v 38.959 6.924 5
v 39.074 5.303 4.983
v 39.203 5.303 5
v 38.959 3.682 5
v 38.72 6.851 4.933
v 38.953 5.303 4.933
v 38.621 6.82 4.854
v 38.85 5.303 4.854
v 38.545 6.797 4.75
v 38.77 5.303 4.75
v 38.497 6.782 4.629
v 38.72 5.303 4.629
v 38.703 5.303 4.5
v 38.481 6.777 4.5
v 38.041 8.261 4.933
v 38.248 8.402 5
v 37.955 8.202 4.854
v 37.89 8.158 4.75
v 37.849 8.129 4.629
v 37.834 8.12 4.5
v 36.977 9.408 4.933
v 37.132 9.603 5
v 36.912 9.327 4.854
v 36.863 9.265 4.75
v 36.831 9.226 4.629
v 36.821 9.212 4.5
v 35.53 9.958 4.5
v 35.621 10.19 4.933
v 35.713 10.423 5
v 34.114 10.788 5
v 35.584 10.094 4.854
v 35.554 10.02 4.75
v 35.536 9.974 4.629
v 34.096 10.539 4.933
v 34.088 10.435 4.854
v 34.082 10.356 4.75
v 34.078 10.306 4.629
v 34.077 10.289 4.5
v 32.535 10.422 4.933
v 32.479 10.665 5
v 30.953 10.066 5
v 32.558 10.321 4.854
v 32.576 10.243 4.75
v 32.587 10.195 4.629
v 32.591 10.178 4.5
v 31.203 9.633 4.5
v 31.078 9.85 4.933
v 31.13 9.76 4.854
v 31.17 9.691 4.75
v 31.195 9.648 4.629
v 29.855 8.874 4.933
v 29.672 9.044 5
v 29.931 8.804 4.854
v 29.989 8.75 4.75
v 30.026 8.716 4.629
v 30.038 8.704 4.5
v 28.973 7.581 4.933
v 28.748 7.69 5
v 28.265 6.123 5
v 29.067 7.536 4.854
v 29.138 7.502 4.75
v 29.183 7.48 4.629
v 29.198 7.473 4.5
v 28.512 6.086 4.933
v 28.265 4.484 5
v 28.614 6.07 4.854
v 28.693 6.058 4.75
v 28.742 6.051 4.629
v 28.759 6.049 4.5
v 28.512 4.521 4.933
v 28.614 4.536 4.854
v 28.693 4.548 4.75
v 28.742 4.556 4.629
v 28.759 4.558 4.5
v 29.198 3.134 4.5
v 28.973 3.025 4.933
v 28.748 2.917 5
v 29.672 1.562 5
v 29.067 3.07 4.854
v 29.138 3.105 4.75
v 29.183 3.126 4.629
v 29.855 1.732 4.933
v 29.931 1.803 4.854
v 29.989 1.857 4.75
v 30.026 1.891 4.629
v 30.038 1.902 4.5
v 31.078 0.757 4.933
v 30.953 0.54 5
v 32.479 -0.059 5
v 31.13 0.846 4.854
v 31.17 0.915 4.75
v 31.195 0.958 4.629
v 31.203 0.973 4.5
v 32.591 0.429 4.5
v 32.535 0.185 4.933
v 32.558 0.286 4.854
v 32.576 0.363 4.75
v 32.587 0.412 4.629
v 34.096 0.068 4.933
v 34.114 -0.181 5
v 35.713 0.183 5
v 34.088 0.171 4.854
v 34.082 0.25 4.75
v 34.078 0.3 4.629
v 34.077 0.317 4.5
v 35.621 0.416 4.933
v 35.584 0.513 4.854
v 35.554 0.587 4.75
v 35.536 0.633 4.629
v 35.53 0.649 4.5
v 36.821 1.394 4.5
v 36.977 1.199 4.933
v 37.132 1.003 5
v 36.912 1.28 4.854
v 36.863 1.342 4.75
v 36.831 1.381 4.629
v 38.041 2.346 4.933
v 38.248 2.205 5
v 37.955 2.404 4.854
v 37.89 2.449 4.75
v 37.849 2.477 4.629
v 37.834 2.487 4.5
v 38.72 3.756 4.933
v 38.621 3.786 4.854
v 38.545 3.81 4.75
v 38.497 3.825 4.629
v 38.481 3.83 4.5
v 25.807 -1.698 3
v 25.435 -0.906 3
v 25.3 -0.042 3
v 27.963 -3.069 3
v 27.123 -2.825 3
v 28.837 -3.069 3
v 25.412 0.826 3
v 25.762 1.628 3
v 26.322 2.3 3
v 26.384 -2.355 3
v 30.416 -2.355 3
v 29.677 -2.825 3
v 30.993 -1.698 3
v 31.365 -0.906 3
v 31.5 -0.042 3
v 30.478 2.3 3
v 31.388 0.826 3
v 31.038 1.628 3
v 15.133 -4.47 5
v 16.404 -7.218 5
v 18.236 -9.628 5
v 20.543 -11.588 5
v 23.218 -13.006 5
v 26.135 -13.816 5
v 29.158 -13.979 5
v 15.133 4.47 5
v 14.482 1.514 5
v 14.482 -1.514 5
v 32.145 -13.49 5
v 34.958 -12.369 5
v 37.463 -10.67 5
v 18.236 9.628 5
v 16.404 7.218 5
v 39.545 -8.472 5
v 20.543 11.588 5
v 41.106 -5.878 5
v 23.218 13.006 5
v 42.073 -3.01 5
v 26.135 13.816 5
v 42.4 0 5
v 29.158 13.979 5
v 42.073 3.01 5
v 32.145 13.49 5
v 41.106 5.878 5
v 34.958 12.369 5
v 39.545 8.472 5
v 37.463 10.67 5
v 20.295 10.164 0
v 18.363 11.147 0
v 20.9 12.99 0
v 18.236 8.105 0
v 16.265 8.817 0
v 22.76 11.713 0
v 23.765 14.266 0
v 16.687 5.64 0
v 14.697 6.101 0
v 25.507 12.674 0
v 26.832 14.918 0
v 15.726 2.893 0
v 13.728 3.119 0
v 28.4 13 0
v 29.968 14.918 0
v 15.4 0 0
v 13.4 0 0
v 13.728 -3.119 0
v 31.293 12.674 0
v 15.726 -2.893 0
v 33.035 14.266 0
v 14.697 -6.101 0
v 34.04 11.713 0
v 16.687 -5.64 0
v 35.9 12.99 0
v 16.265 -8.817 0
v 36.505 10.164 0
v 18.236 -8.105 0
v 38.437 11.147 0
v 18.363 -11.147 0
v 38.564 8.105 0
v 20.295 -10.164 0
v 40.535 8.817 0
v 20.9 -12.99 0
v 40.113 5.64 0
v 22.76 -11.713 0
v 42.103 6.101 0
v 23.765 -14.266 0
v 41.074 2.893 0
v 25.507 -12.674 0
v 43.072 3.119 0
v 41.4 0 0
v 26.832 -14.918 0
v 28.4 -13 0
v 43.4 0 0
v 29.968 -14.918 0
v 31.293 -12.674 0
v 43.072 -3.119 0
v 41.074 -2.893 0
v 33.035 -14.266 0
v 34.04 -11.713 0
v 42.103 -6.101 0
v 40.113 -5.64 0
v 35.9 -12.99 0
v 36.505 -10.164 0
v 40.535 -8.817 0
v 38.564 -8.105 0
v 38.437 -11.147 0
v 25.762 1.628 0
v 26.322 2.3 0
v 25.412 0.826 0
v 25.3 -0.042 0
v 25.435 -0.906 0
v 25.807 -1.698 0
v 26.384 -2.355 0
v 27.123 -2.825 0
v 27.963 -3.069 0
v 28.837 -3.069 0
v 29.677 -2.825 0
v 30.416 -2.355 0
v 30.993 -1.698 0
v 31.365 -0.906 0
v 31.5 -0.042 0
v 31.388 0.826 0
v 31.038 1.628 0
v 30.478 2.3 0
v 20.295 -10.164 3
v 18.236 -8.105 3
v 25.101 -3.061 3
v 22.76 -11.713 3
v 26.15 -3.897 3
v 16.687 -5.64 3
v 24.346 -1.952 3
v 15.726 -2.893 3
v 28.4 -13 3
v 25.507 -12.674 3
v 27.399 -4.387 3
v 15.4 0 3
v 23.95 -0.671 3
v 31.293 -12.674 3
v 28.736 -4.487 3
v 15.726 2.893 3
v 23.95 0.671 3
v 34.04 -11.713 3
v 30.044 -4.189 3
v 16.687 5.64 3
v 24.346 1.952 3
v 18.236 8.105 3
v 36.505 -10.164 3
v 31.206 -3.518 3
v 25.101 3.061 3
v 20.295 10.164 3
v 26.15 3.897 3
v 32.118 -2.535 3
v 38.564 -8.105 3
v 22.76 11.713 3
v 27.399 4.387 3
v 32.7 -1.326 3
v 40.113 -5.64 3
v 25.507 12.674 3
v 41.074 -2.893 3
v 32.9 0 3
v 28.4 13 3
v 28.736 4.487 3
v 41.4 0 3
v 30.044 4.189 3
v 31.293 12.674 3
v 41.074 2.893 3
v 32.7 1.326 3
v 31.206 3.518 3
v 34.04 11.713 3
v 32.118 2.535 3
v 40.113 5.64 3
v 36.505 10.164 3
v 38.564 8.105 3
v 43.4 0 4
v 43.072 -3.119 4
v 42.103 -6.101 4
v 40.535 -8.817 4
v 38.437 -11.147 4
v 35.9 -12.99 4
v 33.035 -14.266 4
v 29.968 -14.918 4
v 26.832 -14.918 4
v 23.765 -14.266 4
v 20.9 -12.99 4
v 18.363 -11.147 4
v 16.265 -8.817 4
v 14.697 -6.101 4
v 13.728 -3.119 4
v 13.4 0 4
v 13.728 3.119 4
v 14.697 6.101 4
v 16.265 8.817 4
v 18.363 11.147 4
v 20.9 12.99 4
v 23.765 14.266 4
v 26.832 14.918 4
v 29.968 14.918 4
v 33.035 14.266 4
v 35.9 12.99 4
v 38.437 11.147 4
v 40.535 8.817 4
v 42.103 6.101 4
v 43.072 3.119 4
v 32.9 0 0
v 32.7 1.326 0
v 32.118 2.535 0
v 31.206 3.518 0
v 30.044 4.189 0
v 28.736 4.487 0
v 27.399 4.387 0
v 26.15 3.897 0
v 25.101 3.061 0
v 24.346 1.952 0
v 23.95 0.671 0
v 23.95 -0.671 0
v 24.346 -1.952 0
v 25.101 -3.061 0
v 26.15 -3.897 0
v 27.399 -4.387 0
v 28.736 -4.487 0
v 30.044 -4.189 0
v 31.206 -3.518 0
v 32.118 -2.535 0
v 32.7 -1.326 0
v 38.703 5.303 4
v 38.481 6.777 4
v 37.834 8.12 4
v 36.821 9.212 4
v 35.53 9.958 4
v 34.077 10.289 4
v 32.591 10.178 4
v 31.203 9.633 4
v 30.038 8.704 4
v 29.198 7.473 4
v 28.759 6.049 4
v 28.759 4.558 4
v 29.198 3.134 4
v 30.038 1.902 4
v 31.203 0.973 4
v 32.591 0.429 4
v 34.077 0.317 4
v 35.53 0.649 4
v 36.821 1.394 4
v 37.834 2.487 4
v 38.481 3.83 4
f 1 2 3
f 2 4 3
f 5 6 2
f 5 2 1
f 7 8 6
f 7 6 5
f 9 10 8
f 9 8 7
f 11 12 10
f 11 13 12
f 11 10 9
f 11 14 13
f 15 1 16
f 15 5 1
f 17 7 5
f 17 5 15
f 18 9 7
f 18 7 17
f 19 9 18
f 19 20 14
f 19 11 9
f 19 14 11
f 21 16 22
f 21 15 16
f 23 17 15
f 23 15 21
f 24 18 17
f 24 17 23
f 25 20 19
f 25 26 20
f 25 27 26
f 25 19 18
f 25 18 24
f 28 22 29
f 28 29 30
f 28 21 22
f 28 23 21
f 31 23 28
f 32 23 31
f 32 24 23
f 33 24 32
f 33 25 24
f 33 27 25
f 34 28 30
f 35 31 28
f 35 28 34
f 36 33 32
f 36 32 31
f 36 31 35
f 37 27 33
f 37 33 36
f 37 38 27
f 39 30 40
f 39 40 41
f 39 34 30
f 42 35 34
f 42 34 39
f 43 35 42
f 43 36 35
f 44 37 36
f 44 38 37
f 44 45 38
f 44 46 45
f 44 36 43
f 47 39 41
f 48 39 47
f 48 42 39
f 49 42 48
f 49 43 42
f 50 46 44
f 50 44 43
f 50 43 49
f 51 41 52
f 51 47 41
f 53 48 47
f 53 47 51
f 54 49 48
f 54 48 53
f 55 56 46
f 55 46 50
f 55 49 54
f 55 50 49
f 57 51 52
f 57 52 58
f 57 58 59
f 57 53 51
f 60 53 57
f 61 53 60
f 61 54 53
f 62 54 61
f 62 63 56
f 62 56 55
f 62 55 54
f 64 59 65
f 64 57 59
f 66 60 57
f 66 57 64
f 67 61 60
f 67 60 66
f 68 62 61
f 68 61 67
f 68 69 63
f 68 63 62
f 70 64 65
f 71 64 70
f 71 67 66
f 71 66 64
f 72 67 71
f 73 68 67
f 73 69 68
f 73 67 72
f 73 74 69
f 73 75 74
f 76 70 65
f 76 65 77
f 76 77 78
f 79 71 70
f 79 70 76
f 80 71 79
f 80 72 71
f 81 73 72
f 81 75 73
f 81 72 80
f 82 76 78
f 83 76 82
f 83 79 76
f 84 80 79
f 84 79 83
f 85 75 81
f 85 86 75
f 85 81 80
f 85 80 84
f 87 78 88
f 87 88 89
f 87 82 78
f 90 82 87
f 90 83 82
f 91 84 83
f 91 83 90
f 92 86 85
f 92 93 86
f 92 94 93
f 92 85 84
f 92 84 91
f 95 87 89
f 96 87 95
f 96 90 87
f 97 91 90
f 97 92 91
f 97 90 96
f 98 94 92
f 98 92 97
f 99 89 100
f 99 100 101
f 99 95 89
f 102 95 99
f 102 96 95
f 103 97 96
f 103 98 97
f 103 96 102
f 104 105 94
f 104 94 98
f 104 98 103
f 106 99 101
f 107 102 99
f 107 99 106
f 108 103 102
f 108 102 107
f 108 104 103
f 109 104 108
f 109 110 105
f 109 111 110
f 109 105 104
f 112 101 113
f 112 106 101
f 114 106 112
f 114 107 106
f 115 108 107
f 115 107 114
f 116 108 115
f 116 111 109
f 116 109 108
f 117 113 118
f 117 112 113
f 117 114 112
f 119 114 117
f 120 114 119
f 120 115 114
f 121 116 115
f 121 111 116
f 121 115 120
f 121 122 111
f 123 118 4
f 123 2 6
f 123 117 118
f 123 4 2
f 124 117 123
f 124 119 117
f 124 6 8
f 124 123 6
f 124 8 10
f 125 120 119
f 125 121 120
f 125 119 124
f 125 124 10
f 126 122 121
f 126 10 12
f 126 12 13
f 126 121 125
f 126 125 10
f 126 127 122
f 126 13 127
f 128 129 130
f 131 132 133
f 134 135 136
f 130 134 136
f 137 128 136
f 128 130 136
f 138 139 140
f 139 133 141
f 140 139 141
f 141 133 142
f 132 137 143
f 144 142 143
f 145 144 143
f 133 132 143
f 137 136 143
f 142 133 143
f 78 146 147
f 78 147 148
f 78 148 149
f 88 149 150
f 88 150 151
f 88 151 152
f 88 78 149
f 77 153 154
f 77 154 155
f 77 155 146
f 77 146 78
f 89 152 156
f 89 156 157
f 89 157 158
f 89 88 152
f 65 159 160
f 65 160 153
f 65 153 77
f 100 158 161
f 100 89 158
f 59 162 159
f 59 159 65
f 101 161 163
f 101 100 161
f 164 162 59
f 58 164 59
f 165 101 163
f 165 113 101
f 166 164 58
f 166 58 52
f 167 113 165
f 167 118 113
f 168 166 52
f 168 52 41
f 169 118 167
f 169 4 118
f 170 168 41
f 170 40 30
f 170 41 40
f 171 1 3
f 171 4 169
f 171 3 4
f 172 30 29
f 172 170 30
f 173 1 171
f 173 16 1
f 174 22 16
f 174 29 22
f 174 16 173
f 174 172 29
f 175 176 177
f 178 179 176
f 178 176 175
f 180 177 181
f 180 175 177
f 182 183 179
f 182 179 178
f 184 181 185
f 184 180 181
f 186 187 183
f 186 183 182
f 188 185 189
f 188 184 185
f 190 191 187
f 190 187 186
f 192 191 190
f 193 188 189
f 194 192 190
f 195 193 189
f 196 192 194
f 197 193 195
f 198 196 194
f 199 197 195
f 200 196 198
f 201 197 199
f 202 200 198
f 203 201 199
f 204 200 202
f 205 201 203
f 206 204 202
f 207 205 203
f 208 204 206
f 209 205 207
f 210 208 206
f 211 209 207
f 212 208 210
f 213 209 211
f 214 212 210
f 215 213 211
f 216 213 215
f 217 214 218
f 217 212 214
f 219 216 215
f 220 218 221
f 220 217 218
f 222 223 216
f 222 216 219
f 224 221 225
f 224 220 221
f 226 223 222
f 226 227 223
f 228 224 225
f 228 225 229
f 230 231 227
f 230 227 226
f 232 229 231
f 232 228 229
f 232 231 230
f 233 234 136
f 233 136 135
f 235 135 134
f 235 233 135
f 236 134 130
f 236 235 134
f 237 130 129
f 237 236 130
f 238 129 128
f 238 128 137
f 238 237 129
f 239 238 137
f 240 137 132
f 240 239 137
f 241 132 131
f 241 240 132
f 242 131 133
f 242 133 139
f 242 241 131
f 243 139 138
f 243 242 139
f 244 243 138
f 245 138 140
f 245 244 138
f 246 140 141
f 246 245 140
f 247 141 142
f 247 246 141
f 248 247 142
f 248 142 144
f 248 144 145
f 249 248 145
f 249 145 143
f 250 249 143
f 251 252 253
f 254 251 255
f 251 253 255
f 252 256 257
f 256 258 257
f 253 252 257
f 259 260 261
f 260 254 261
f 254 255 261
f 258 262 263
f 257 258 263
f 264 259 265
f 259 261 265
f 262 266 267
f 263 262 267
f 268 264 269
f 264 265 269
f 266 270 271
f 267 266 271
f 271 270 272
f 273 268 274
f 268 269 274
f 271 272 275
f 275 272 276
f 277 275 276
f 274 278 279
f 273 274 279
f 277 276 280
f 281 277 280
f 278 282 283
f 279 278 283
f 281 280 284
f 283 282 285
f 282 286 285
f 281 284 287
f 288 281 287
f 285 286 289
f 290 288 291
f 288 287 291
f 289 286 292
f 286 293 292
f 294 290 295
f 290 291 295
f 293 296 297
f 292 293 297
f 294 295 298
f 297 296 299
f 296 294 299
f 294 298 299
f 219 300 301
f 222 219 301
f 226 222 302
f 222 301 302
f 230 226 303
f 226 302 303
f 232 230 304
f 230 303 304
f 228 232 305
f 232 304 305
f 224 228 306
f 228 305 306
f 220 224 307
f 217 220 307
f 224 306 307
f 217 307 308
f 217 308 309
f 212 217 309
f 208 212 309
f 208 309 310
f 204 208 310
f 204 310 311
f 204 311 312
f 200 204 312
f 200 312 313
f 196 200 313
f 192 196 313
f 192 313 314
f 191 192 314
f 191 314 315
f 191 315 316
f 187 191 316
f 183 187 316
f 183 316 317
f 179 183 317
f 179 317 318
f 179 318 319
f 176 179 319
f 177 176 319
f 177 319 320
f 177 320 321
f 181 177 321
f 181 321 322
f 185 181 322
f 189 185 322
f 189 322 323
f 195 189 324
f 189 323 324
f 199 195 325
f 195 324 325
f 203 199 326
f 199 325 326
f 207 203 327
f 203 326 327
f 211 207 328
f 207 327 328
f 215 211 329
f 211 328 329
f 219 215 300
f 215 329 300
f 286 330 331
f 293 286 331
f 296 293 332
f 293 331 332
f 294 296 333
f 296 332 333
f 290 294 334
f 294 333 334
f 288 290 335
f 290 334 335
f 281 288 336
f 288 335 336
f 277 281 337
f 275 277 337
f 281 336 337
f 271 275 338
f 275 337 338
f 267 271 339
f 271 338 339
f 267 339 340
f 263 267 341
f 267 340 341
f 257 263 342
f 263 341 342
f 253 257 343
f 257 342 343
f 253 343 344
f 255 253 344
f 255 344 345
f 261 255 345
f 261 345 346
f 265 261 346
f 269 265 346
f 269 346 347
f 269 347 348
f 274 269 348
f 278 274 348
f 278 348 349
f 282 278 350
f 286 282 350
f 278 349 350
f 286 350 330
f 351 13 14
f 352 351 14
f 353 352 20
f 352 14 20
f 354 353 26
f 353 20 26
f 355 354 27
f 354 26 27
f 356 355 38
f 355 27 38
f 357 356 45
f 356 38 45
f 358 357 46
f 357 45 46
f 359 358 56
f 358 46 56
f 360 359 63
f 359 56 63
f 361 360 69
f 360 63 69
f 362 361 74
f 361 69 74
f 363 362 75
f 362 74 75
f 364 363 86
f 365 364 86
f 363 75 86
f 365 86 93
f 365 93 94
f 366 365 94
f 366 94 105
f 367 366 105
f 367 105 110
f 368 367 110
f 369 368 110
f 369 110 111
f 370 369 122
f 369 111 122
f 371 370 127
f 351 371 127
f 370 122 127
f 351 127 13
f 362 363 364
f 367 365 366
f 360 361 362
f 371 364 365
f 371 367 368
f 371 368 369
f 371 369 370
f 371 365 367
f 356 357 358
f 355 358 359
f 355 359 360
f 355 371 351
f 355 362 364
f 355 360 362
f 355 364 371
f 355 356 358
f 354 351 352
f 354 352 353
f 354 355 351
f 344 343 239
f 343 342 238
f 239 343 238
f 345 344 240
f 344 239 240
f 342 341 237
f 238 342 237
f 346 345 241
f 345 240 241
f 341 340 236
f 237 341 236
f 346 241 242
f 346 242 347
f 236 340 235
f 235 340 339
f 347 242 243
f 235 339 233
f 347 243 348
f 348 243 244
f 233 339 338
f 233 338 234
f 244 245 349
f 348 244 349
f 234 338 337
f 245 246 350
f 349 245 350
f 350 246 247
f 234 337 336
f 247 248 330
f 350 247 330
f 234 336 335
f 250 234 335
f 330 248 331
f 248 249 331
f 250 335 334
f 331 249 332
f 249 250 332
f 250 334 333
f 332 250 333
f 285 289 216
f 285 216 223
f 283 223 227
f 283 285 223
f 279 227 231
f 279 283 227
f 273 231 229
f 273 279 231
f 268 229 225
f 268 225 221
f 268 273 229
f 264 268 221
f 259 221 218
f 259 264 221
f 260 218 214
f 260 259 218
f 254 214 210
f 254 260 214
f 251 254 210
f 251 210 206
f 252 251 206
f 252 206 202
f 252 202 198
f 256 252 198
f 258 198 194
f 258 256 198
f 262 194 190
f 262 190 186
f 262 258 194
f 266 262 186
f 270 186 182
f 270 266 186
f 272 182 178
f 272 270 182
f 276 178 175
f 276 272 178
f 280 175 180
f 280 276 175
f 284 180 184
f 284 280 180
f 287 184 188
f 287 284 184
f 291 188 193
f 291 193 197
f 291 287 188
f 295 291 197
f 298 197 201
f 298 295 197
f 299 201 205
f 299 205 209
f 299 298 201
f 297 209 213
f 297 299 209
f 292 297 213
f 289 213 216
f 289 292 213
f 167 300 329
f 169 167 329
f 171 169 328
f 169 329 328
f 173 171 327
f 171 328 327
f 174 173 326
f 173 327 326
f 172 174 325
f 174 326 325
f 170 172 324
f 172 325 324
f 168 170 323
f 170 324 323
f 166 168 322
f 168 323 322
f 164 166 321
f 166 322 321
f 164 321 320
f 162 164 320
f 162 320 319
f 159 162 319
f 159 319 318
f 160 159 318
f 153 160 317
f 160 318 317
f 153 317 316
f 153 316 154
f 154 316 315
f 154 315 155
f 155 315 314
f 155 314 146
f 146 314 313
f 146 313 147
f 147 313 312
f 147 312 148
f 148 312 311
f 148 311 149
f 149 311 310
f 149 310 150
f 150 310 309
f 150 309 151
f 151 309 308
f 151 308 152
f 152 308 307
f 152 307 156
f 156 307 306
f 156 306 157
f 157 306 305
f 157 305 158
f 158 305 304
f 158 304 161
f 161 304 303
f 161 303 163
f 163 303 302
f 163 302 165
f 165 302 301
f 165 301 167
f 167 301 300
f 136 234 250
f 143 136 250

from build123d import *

# Parameters (mm, degrees)
SKETCH004_R     = 4.5
PAD003_DEPTH    = 3
SKETCH005_R     = 15
PAD004_DEPTH    = 2
SKETCH006_R     = 15
SKETCH006_R_2   = 13
PAD005_DEPTH    = 3
SKETCH007_R     = 5
POCKET001_DEPTH = 1
FILLET001_R     = 0.5
CHAMFER001_SIZE = 1


with BuildPart() as part:
    # Sketch004 → Pad003 (new body)
    with BuildSketch(Plane.XY):
        Circle(SKETCH004_R)
        with BuildLine():
            ThreePointArc((-2.078461, 2.3), (0, -3.1), (2.078461, 2.3))
            Line((-2.078461, 2.3), (2.078461, 2.3))
        make_face(mode=Mode.SUBTRACT)
    extrude(amount=PAD003_DEPTH)

    # Sketch005 (on Face5 of Pad003) → Pad004 (join)
    with BuildSketch(Plane.XY.offset(3)):
        Circle(SKETCH005_R)
    extrude(amount=PAD004_DEPTH)

    # Sketch006 (on Face2 of Pad004) → Pad005 (join)
    with BuildSketch(Plane(origin=(0, 0, 3), x_dir=(1, 0, 0), z_dir=(0, 0, -1))):
        Circle(SKETCH006_R)
        Circle(SKETCH006_R_2, mode=Mode.SUBTRACT)
    extrude(amount=PAD005_DEPTH)

    # Sketch007 (on Face3 of Pad005) → Pocket001 (cut)
    with BuildSketch(Plane.XY.offset(5)):
        with Locations((5.303301, 5.303301)):
            Circle(SKETCH007_R)
    extrude(amount=-POCKET001_DEPTH, mode=Mode.SUBTRACT)

    # Fillet001
    fillet001_edges = [part.edges().sort_by_distance(p)[0] for p in [
        (0.303301, 5.303301, 5),
    ]]
    fillet(fillet001_edges, radius=FILLET001_R)

    # Chamfer001
    chamfer001_edges = [part.edges().sort_by_distance(p)[0] for p in [
        (-15, 0, 5),
    ]]
    chamfer(chamfer001_edges, length=CHAMFER001_SIZE)


with BuildPart() as part_1:
    # Body001 placement: moved
    add(part.part.moved(Location((28.4, 0, 0))))


solid = part_1.part
